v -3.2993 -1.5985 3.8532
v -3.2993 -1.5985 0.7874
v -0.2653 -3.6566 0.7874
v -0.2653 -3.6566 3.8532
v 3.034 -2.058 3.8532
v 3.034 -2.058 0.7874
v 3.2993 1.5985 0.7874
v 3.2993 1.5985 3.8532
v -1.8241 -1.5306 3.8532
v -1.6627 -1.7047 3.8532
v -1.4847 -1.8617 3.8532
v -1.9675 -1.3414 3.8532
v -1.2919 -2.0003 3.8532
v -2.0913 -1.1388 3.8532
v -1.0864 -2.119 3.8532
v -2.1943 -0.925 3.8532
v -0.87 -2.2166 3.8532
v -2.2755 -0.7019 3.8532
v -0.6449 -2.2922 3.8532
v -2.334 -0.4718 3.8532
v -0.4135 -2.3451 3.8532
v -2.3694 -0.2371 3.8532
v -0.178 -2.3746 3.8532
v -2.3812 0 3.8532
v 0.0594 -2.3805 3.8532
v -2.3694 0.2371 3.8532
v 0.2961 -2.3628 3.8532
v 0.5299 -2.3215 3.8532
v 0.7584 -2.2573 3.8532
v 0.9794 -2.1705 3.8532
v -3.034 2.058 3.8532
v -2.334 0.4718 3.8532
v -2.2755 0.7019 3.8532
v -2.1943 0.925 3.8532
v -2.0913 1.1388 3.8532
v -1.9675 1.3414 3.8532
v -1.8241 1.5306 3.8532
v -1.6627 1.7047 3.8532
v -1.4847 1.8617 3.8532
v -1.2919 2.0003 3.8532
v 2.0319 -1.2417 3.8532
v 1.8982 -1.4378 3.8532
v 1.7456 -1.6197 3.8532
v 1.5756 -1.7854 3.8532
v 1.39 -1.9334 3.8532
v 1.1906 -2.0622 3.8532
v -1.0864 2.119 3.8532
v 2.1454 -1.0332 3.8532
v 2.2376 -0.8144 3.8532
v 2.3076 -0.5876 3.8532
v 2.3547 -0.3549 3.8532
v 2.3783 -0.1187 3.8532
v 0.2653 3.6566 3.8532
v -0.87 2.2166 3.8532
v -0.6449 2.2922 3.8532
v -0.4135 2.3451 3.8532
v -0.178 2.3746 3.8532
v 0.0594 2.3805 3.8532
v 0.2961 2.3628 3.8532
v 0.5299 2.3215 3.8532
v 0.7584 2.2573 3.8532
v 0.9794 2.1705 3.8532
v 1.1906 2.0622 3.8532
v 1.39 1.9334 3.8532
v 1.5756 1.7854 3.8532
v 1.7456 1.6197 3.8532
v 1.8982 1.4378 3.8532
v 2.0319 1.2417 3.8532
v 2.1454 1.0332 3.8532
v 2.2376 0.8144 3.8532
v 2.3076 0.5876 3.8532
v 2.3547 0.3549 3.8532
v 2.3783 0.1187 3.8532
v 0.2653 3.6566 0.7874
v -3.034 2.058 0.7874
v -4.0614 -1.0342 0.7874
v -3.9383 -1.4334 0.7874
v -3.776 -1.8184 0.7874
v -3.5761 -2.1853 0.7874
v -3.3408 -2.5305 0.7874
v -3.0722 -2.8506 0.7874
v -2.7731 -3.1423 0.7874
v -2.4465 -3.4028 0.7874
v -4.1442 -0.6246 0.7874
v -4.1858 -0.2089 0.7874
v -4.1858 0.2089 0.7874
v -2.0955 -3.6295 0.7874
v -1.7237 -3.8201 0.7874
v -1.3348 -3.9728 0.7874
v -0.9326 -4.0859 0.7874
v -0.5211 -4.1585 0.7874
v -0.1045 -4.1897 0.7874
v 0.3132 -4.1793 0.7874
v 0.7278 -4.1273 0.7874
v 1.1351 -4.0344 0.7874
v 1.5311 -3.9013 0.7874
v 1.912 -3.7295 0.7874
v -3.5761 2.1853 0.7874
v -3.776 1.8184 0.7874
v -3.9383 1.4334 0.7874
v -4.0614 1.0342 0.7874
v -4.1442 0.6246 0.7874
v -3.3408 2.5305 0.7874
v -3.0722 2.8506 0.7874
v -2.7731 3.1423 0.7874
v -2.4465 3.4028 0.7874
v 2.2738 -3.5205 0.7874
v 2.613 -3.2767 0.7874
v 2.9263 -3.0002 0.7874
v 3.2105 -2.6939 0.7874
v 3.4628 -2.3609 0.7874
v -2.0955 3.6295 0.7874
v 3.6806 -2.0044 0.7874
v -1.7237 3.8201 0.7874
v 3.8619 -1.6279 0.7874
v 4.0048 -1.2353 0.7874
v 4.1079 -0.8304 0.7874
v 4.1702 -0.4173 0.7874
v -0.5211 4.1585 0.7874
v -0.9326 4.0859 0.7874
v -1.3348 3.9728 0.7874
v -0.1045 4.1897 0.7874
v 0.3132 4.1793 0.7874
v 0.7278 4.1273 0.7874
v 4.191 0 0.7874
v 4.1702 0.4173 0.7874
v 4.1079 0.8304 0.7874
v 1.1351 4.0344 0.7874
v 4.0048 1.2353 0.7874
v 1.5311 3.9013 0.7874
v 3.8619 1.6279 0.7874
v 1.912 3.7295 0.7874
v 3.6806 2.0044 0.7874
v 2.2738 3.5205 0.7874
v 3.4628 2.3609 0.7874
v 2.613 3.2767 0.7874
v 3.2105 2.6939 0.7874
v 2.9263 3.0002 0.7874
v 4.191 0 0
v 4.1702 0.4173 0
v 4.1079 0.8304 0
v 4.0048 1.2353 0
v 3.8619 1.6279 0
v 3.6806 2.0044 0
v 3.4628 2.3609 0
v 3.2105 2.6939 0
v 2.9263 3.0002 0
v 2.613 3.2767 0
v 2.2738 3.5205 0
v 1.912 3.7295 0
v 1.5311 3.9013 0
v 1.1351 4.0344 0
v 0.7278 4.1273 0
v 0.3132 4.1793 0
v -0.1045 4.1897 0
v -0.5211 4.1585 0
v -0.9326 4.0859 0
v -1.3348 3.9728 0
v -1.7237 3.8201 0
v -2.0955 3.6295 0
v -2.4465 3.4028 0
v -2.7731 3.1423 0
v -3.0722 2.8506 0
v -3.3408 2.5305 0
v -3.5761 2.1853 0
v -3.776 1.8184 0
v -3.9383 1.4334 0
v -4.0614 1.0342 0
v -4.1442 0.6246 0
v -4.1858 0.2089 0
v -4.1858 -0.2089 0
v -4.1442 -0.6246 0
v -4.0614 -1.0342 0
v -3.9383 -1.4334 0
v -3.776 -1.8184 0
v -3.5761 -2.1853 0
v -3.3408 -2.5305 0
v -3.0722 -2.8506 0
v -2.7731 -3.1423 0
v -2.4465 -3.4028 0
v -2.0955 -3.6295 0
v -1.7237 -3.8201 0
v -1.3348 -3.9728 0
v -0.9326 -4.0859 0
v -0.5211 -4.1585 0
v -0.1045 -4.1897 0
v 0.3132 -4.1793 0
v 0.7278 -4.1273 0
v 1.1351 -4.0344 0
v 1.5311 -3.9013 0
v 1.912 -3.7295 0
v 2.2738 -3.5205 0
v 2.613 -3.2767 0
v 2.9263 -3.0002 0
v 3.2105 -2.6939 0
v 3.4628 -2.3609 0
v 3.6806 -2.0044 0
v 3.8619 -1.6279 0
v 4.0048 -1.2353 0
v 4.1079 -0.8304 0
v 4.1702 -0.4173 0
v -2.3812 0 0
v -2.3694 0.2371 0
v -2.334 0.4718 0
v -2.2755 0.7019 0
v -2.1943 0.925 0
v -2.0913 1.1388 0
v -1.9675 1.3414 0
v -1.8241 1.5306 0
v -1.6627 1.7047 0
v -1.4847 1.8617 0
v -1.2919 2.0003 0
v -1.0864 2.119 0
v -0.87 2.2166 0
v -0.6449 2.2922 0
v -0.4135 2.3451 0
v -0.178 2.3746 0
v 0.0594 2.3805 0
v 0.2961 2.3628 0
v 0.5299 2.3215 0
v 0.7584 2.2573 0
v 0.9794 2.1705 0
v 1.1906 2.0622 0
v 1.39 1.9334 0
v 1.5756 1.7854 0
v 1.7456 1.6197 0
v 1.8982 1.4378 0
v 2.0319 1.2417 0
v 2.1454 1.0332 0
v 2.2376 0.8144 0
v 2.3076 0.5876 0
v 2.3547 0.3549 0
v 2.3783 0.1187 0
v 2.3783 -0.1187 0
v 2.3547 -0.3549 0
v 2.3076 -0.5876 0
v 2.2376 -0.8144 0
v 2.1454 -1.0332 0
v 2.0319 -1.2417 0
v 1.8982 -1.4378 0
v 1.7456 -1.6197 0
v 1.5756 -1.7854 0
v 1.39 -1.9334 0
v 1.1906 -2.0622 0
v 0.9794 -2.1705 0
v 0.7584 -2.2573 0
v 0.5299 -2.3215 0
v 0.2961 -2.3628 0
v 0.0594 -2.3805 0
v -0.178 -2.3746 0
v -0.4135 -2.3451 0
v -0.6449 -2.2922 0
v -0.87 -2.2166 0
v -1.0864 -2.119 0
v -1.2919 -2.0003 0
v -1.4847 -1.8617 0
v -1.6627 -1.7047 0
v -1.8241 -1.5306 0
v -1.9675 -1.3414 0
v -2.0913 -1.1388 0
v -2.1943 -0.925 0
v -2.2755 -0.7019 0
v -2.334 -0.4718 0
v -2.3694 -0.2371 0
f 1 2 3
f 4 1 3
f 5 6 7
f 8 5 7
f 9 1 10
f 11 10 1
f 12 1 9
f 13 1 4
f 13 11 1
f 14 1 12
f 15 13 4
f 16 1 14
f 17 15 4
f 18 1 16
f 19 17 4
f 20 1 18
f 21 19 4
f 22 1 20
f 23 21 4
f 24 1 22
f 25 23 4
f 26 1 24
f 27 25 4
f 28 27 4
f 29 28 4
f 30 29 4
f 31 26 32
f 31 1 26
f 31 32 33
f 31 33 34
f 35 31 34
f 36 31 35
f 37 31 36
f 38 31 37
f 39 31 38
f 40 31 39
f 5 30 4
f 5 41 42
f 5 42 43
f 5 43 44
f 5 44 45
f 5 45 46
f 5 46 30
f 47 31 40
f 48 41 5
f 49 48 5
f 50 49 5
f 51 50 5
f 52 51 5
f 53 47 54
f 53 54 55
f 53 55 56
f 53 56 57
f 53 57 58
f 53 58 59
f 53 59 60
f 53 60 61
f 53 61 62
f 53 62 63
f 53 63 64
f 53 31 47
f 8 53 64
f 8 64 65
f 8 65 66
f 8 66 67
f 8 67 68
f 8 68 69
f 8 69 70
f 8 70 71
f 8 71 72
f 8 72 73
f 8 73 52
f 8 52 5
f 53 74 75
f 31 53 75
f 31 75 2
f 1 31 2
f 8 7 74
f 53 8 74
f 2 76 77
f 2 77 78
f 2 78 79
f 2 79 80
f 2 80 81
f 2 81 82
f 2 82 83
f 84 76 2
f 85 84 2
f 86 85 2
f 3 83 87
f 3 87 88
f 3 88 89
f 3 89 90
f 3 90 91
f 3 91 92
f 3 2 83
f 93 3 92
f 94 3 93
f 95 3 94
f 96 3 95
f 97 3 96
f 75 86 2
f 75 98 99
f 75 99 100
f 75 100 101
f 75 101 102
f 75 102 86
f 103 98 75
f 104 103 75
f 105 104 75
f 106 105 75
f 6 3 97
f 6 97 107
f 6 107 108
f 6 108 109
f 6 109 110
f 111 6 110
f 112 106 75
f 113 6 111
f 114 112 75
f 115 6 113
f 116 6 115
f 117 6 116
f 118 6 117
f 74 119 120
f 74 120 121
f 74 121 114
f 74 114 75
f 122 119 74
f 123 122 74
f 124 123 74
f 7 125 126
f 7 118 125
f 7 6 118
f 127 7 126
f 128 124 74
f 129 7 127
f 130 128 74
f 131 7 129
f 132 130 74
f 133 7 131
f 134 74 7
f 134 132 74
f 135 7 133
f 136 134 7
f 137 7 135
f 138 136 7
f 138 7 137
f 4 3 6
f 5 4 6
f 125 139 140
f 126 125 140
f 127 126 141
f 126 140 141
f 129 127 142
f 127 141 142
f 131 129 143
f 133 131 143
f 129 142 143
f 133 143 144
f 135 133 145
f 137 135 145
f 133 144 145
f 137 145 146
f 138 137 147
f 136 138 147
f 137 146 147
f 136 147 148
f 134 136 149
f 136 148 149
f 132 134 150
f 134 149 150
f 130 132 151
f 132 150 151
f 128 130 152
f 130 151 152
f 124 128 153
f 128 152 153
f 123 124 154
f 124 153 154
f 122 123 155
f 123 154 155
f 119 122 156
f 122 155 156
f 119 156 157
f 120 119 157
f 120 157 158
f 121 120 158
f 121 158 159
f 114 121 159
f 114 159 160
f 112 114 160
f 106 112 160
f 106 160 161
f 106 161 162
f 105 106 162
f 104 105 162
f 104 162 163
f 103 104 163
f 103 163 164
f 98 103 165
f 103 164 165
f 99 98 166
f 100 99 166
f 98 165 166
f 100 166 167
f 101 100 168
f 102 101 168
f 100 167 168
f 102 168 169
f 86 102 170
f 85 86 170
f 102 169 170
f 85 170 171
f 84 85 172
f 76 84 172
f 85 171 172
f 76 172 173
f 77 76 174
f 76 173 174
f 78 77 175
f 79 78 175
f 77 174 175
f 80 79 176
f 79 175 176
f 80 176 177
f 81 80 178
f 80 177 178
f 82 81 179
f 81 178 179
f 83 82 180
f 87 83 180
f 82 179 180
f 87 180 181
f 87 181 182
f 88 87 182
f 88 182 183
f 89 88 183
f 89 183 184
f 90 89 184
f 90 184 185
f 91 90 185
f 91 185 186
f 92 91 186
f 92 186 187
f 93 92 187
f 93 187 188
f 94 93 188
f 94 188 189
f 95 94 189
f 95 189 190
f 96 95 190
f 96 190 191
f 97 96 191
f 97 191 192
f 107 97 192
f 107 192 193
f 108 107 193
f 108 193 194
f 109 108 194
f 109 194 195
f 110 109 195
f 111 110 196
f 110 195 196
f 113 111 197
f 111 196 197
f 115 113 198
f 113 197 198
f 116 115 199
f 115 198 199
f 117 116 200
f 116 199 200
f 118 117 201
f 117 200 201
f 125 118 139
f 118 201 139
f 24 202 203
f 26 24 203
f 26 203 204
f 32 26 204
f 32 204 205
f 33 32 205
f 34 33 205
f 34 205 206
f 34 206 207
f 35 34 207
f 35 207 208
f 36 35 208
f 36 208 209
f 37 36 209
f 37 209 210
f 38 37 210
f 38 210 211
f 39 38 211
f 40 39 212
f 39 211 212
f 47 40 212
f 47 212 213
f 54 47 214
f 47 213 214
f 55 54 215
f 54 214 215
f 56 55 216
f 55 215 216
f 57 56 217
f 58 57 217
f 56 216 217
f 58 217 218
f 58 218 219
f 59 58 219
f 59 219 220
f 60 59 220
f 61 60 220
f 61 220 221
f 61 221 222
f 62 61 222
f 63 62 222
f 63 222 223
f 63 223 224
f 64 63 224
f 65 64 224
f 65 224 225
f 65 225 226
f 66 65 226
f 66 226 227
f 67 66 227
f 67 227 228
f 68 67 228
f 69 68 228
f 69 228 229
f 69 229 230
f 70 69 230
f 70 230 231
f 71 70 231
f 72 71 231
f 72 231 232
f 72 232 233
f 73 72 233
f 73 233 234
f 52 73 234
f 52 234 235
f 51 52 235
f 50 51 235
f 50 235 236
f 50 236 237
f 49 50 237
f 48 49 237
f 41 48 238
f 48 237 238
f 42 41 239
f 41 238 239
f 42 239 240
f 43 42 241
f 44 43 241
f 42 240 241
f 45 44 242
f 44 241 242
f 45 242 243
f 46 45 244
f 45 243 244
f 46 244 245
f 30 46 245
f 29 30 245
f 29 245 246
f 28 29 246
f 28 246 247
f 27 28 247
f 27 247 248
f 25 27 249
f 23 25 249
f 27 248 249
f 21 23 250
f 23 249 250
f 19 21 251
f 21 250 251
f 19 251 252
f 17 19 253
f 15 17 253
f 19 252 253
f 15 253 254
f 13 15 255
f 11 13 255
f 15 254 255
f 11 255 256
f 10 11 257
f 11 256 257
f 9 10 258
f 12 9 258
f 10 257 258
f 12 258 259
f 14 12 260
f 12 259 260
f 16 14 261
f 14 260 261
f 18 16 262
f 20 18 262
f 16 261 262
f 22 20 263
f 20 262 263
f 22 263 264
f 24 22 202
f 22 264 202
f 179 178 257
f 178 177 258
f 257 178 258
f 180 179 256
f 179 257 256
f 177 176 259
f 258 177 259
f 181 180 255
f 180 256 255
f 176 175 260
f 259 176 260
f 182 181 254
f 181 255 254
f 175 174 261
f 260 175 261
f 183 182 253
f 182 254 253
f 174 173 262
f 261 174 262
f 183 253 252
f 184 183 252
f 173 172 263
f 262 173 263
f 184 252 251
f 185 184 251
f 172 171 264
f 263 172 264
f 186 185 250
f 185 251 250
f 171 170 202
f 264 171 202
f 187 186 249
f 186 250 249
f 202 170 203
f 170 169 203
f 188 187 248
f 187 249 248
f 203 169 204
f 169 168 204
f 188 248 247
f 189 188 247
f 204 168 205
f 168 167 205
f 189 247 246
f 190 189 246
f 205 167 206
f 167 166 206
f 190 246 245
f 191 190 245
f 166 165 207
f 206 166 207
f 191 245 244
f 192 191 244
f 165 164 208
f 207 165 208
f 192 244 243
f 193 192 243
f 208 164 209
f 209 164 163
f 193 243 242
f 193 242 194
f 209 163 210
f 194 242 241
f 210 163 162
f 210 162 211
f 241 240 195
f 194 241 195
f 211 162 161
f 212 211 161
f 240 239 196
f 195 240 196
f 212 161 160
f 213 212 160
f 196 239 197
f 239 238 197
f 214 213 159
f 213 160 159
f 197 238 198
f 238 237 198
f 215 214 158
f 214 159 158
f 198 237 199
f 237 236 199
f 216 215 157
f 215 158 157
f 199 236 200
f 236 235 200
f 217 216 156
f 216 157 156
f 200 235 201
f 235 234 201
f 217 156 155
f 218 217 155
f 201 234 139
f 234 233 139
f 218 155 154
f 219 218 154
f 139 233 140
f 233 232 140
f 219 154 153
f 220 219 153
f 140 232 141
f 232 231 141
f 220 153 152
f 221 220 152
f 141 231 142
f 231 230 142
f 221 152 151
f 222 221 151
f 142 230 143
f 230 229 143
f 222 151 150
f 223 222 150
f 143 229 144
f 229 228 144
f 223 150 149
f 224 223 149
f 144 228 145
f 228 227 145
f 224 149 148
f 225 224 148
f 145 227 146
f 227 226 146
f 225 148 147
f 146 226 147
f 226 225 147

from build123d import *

# Parameters (mm, degrees)
SKETCH1_R      = 4.191
EXTRUDE1_DEPTH = 0.7874
EXTRUDE2_DEPTH = 3.85318
SKETCH3_R      = 2.38125
EXTRUDE3_DEPTH = 8.069367589


with BuildPart() as part:
    # Sketch1 → Extrude1 (new body)
    with BuildSketch(Plane.XY):
        Circle(SKETCH1_R)
    extrude(amount=EXTRUDE1_DEPTH)

    # Sketch2 → Extrude2 (add)
    with BuildSketch(Plane.XY):
        Polygon((-0.265291692, -3.656563093), (3.034030683, -2.058030891), (3.299322375, 1.598532202), (0.265291692, 3.656563093), (-3.034030683, 2.058030891), (-3.299322375, -1.598532202), align=None)
    extrude(amount=EXTRUDE2_DEPTH)

    # Sketch3 → Extrude3 (cut, through all)
    with BuildSketch(Plane(origin=(0, 0, 0), x_dir=(-1, 0, 0), z_dir=(0, 0, -1))):
        Circle(SKETCH3_R)
    extrude(amount=-EXTRUDE3_DEPTH, mode=Mode.SUBTRACT)


solid = part.part
